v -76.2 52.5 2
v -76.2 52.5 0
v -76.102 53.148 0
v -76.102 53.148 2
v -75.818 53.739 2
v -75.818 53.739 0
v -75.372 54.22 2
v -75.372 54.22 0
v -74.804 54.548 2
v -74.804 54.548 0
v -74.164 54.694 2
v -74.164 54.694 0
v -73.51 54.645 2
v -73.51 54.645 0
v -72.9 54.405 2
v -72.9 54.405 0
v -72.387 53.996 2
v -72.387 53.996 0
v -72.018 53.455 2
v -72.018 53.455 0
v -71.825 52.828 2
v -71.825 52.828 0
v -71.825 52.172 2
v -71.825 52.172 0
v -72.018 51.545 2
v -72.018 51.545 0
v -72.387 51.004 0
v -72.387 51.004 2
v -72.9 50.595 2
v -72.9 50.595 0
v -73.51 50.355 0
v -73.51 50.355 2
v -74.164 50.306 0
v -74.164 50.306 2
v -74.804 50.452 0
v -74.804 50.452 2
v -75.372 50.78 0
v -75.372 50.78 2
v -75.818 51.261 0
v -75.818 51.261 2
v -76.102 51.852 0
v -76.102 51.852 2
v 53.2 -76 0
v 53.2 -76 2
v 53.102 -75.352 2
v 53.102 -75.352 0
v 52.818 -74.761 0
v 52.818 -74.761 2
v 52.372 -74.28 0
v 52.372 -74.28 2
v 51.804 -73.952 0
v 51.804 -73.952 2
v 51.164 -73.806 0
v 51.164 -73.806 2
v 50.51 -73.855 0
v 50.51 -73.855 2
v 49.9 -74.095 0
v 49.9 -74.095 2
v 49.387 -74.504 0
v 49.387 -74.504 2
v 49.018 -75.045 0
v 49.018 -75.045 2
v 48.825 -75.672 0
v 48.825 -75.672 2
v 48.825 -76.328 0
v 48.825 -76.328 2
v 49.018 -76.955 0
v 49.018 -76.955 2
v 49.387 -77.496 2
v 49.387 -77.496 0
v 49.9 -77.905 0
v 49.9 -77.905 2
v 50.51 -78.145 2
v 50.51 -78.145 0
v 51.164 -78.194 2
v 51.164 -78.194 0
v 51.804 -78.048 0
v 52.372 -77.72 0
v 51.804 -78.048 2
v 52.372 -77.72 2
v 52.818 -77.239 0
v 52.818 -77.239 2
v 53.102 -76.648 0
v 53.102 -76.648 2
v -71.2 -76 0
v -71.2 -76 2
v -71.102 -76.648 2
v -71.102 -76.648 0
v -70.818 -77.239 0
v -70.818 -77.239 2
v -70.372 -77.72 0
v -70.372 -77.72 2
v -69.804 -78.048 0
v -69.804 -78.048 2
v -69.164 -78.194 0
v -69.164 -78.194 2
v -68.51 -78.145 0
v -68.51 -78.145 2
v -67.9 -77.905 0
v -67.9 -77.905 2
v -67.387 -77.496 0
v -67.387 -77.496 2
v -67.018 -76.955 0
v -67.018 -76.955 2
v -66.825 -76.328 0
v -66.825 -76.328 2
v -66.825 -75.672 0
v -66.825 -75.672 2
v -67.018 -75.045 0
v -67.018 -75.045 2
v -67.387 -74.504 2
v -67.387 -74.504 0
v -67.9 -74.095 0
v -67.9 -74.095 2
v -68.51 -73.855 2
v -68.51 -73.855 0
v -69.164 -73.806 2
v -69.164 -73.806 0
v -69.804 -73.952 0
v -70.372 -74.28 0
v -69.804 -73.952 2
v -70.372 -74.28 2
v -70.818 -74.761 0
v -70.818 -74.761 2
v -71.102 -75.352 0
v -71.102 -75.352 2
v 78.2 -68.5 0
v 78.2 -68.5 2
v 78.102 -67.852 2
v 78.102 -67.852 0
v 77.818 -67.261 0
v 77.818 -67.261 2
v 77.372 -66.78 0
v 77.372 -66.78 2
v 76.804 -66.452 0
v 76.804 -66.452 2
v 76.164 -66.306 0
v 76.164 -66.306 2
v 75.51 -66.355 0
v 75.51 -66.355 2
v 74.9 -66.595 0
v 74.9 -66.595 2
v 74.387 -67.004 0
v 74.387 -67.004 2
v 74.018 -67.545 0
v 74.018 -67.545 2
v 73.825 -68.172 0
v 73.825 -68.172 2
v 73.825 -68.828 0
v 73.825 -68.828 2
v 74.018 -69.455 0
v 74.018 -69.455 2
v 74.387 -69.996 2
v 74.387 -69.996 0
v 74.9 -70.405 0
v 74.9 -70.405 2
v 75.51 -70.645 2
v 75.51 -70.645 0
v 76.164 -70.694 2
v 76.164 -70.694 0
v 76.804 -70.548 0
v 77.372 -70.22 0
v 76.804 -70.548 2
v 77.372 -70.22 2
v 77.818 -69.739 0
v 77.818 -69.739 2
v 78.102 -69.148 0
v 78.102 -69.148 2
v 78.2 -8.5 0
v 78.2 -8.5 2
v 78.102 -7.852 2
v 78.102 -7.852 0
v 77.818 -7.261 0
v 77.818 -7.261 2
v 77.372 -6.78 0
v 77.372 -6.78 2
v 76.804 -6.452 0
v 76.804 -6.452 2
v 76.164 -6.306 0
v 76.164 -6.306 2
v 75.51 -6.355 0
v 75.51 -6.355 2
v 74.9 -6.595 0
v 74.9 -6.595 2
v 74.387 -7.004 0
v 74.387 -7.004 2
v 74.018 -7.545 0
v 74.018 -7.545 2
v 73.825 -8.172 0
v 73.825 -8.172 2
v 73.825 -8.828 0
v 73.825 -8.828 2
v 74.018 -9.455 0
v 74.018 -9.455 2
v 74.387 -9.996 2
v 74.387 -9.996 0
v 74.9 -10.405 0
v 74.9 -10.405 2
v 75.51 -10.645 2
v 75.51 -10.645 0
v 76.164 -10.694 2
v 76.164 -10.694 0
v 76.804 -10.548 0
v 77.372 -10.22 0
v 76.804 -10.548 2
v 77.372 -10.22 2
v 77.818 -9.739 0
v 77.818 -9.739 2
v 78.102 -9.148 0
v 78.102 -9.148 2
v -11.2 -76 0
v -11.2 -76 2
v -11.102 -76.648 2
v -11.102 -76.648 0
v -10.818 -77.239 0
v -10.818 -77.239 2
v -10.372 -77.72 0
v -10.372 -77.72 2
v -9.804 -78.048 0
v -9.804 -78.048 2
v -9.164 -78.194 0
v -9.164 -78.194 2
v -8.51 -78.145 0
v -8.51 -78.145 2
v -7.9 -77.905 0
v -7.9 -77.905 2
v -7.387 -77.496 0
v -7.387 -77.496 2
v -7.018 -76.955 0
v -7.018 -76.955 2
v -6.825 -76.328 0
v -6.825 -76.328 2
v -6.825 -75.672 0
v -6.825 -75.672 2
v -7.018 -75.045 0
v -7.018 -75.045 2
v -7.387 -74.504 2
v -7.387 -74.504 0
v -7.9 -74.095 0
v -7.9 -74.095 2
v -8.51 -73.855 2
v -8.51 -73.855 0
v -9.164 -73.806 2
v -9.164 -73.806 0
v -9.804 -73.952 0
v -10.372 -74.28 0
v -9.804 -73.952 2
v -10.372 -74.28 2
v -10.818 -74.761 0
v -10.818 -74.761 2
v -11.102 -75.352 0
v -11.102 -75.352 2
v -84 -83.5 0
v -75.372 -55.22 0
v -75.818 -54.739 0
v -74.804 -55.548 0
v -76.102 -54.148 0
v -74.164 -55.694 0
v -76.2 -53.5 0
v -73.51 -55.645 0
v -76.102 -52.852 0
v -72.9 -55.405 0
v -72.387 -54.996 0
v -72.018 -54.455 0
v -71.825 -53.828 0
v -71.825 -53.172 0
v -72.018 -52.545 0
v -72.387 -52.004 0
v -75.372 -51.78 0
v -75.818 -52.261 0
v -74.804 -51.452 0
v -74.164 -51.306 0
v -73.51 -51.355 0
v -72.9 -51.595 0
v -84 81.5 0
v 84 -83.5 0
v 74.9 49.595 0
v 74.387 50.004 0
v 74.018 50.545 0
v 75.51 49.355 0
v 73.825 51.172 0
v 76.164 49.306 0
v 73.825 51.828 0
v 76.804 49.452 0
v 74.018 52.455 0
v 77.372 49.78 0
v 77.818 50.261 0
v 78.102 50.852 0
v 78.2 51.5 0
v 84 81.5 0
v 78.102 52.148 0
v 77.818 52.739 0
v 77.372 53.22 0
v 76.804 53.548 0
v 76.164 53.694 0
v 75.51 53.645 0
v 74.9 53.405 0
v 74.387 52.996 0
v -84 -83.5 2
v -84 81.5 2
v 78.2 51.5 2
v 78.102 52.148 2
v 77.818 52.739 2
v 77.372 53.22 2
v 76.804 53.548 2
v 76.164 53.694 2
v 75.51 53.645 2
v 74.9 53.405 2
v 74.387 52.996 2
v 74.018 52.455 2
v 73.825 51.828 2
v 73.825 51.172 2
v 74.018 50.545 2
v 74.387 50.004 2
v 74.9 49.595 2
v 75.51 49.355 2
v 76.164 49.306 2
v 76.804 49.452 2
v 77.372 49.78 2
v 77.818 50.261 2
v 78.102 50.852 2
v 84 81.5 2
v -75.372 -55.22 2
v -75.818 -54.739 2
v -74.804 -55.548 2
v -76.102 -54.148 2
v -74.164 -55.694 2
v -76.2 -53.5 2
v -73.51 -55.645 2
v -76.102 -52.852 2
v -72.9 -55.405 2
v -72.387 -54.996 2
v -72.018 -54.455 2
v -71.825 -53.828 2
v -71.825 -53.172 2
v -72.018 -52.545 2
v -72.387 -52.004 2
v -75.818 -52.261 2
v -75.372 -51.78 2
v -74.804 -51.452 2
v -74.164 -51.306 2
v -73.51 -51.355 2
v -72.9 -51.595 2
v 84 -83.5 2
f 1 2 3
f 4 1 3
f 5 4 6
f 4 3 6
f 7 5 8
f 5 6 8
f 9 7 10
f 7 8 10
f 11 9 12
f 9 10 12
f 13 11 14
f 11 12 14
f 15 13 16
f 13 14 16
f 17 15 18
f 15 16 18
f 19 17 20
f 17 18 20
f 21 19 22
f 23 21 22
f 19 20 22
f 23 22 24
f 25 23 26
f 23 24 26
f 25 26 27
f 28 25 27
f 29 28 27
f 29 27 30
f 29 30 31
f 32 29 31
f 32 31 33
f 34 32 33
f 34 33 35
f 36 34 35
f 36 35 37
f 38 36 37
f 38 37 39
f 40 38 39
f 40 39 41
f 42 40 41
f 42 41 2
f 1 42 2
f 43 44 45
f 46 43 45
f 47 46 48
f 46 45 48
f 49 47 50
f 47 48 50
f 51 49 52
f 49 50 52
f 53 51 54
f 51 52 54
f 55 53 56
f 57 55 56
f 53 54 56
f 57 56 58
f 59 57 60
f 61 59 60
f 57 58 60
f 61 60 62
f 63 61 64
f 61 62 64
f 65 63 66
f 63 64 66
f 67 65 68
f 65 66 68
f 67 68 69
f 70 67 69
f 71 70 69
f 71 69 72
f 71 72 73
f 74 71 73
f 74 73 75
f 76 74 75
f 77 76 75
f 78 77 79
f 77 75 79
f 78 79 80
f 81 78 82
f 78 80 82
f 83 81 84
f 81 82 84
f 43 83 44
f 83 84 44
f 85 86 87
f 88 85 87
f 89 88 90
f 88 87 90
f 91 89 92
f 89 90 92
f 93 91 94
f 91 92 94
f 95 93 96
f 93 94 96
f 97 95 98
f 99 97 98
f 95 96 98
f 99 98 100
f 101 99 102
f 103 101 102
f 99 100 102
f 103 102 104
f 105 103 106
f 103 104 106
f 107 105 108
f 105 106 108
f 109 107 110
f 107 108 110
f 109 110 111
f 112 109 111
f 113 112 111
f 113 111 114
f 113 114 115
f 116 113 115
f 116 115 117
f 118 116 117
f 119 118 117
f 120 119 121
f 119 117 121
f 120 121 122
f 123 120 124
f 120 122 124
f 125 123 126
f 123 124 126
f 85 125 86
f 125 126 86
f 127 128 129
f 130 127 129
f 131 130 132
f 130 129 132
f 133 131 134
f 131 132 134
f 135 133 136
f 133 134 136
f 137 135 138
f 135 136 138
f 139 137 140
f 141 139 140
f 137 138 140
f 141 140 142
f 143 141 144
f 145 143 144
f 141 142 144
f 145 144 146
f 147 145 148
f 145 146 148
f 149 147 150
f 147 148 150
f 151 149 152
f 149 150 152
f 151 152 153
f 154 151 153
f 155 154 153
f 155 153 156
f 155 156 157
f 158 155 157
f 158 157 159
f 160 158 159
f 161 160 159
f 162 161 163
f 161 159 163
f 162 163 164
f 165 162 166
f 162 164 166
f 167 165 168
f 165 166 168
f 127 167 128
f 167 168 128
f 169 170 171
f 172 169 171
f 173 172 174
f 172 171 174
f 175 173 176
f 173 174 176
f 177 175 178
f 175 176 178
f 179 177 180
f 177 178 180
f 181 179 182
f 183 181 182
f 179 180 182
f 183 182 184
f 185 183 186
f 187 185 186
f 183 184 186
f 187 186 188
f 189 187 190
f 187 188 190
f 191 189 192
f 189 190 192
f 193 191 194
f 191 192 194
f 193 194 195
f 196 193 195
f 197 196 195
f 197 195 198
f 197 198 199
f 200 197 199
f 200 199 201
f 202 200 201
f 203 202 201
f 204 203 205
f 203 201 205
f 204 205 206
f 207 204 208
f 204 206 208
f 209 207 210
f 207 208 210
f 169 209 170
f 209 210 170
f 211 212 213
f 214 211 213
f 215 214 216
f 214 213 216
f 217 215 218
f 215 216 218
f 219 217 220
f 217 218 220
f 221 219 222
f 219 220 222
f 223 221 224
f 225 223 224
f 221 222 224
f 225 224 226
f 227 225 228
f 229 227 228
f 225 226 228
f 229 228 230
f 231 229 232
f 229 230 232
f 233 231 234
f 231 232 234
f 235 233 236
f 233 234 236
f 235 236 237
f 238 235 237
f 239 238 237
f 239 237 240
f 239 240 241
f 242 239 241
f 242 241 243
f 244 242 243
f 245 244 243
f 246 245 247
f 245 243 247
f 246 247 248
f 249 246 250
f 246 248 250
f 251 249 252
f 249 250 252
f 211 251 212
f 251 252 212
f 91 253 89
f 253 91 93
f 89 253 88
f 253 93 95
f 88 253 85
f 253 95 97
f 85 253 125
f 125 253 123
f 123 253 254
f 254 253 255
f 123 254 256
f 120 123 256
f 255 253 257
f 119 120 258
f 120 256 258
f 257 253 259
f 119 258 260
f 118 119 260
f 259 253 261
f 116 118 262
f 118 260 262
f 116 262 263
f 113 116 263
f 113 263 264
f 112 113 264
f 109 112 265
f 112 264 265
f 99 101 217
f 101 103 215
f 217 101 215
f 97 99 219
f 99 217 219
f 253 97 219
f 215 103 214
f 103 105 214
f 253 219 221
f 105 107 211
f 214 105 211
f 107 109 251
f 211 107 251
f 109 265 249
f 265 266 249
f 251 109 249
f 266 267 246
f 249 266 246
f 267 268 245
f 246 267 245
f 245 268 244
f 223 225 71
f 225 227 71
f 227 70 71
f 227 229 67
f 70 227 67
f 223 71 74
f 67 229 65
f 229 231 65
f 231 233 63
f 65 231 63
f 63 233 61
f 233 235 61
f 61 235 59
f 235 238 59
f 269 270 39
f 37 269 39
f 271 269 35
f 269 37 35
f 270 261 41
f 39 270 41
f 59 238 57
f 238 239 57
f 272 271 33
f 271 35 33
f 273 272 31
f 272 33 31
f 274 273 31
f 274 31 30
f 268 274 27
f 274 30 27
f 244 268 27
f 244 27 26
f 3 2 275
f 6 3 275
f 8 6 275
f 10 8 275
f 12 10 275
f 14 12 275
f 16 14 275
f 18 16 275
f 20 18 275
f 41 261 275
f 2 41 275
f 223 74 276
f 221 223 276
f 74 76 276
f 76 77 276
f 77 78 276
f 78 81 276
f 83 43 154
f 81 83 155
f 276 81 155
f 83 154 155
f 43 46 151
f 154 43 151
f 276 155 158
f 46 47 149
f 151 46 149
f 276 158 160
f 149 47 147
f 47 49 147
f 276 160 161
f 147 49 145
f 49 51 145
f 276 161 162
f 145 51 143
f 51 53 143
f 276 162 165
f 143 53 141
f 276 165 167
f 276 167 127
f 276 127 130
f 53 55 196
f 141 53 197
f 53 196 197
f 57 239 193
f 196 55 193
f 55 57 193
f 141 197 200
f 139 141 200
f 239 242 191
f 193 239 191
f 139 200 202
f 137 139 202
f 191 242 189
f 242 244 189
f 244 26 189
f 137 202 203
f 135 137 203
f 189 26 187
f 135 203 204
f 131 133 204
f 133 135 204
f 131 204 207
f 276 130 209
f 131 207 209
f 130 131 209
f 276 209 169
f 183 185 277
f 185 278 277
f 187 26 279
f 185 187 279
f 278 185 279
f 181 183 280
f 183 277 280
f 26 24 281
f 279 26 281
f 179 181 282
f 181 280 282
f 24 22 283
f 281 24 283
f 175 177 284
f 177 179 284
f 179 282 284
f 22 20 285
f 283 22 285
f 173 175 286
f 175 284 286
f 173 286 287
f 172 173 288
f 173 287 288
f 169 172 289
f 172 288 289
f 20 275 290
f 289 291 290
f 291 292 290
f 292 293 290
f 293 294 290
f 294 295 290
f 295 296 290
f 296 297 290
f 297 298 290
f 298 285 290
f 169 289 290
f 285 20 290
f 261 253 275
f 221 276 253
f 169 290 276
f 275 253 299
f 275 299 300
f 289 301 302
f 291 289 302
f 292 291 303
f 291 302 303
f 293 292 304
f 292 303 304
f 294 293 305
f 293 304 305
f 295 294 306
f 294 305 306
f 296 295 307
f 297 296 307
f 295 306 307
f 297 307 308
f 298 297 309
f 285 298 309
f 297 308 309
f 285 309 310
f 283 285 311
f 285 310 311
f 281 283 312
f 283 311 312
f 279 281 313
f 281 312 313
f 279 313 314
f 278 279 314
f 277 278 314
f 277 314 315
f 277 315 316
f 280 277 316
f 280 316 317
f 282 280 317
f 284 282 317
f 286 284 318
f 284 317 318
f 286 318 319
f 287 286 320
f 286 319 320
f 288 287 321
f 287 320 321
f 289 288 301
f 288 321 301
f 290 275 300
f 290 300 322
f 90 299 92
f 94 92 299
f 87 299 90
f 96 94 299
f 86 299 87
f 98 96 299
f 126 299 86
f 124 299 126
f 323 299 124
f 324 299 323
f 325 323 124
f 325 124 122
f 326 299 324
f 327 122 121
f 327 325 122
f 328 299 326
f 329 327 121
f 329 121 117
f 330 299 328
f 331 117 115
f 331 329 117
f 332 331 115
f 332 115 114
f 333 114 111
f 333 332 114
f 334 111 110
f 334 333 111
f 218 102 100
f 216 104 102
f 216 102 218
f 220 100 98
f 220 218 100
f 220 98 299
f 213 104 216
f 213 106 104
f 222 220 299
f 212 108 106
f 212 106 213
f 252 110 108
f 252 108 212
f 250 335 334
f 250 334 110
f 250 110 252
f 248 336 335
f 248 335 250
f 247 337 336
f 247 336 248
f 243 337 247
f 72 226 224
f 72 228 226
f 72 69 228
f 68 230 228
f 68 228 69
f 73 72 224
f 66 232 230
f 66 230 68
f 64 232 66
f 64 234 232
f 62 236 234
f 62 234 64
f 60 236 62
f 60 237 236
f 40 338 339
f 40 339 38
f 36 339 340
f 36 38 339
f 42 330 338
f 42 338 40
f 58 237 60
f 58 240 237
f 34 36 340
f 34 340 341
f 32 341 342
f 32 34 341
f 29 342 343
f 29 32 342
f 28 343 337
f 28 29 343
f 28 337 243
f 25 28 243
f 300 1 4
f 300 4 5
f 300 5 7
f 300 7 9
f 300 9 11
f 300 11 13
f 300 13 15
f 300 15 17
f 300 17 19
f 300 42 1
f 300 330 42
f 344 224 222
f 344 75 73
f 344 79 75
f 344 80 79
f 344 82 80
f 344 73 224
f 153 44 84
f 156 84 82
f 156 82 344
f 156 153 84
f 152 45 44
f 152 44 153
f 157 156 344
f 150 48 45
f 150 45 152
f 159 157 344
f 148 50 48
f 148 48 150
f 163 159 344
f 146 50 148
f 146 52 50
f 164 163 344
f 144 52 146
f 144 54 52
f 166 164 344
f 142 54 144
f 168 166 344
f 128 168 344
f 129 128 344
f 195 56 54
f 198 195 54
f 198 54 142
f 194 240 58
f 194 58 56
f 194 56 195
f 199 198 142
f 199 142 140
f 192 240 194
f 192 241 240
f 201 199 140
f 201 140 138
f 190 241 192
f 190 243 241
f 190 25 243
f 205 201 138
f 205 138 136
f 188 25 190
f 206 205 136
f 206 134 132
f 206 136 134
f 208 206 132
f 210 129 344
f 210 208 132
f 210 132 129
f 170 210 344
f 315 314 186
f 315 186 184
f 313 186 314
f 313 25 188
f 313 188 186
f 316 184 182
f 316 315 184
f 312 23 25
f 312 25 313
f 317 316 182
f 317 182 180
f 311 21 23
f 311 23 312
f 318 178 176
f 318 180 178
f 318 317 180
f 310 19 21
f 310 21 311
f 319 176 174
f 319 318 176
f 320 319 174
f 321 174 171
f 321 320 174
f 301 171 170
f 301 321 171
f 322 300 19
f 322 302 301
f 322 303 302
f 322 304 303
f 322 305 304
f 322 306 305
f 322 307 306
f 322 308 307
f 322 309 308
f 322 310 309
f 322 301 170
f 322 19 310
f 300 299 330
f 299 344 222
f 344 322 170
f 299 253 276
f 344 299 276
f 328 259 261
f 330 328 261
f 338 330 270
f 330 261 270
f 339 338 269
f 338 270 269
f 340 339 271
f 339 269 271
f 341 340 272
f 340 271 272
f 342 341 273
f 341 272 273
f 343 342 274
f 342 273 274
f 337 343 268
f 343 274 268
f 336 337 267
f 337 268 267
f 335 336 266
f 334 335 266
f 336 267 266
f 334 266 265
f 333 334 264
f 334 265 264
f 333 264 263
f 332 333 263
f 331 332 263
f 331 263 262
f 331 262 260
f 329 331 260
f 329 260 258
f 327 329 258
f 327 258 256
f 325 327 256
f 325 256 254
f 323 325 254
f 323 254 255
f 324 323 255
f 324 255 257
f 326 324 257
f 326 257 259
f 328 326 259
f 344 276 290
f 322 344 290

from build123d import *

# Parameters (mm, degrees)
SKETCH_1_W          = 168
SKETCH_1_H          = 167
EXTRUDE_1_DEPTH     = 2
SKETCH_2_R          = 2.2
CUT_EXTRUDE_1_DEPTH = 2
SKETCH_3_W          = 168
SKETCH_3_H          = 2
CUT_EXTRUDE_2_DEPTH = 2
SKETCH_4_R          = 2.2
CUT_EXTRUDE_3_DEPTH = 2
SKETCH_6_R          = 2.2
CUT_EXTRUDE_5_DEPTH = 10
SKETCH_7_R          = 2.2
CUT_EXTRUDE_6_DEPTH = 10


with BuildPart() as part:
    # ｽｹｯﾁ1 → ﾎﾞｽ - 押し出し1 (new body)
    with BuildSketch(Plane.XY):
        Rectangle(SKETCH_1_W, SKETCH_1_H)
    extrude(amount=EXTRUDE_1_DEPTH)

    # ｽｹｯﾁ2 → ｶｯﾄ - 押し出し1 (cut)
    with BuildSketch(Plane.XY.offset(2)):
        with Locations((76, -68.5)):
            Circle(SKETCH_2_R)
        with Locations((76, -8.5)):
            Circle(SKETCH_2_R)
        with Locations((76, 51.5)):
            Circle(SKETCH_2_R)
    extrude(amount=-CUT_EXTRUDE_1_DEPTH, mode=Mode.SUBTRACT)

    # ｽｹｯﾁ3 → ｶｯﾄ - 押し出し2 (cut)
    with BuildSketch(Plane(origin=(0, 83.5, 0), x_dir=(1, 0, 0), z_dir=(0, 1, 0))):
        with Locations((0, -1)):
            Rectangle(SKETCH_3_W, SKETCH_3_H)
    extrude(amount=-CUT_EXTRUDE_2_DEPTH, mode=Mode.SUBTRACT)

    # ｽｹｯﾁ4 → ｶｯﾄ - 押し出し3 (cut)
    with BuildSketch(Plane.XY.offset(2)):
        with BuildLine():
            ThreePointArc((-6.8, -76), (-9, -73.8), (-11.2, -76))
            Line((-11.2, -76), (-9, -76))
            Line((-9, -76), (-6.8, -76))
        make_face()
        with BuildLine():
            Line((-9, -76), (-11.2, -76))
            ThreePointArc((-11.2, -76), (-9, -78.2), (-6.8, -76))
            Line((-6.8, -76), (-9, -76))
        make_face()
        with BuildLine():
            ThreePointArc((-66.8, -76), (-69, -73.8), (-71.2, -76))
            Line((-71.2, -76), (-69, -76))
            Line((-69, -76), (-66.8, -76))
        make_face()
        with BuildLine():
            Line((-69, -76), (-71.2, -76))
            ThreePointArc((-71.2, -76), (-69, -78.2), (-66.8, -76))
            Line((-66.8, -76), (-69, -76))
        make_face()
        with Locations((51, -76)):
            Circle(SKETCH_4_R)
    extrude(amount=-CUT_EXTRUDE_3_DEPTH, mode=Mode.SUBTRACT)

    # ｽｹｯﾁ6 → ｶｯﾄ - 押し出し5 (cut)
    with BuildSketch(Plane(origin=(0, 0, 0), x_dir=(-1, 0, 0), z_dir=(0, 0, -1))):
        with Locations((74, 52.5)):
            Circle(SKETCH_6_R)
    extrude(amount=-CUT_EXTRUDE_5_DEPTH, mode=Mode.SUBTRACT)

    # ｽｹｯﾁ7 → ｶｯﾄ - 押し出し6 (cut)
    with BuildSketch(Plane(origin=(0, 0, 0), x_dir=(-1, 0, 0), z_dir=(0, 0, -1))):
        with Locations((74, -53.5)):
            Circle(SKETCH_7_R)
    extrude(amount=-CUT_EXTRUDE_6_DEPTH, mode=Mode.SUBTRACT)


solid = part.part
